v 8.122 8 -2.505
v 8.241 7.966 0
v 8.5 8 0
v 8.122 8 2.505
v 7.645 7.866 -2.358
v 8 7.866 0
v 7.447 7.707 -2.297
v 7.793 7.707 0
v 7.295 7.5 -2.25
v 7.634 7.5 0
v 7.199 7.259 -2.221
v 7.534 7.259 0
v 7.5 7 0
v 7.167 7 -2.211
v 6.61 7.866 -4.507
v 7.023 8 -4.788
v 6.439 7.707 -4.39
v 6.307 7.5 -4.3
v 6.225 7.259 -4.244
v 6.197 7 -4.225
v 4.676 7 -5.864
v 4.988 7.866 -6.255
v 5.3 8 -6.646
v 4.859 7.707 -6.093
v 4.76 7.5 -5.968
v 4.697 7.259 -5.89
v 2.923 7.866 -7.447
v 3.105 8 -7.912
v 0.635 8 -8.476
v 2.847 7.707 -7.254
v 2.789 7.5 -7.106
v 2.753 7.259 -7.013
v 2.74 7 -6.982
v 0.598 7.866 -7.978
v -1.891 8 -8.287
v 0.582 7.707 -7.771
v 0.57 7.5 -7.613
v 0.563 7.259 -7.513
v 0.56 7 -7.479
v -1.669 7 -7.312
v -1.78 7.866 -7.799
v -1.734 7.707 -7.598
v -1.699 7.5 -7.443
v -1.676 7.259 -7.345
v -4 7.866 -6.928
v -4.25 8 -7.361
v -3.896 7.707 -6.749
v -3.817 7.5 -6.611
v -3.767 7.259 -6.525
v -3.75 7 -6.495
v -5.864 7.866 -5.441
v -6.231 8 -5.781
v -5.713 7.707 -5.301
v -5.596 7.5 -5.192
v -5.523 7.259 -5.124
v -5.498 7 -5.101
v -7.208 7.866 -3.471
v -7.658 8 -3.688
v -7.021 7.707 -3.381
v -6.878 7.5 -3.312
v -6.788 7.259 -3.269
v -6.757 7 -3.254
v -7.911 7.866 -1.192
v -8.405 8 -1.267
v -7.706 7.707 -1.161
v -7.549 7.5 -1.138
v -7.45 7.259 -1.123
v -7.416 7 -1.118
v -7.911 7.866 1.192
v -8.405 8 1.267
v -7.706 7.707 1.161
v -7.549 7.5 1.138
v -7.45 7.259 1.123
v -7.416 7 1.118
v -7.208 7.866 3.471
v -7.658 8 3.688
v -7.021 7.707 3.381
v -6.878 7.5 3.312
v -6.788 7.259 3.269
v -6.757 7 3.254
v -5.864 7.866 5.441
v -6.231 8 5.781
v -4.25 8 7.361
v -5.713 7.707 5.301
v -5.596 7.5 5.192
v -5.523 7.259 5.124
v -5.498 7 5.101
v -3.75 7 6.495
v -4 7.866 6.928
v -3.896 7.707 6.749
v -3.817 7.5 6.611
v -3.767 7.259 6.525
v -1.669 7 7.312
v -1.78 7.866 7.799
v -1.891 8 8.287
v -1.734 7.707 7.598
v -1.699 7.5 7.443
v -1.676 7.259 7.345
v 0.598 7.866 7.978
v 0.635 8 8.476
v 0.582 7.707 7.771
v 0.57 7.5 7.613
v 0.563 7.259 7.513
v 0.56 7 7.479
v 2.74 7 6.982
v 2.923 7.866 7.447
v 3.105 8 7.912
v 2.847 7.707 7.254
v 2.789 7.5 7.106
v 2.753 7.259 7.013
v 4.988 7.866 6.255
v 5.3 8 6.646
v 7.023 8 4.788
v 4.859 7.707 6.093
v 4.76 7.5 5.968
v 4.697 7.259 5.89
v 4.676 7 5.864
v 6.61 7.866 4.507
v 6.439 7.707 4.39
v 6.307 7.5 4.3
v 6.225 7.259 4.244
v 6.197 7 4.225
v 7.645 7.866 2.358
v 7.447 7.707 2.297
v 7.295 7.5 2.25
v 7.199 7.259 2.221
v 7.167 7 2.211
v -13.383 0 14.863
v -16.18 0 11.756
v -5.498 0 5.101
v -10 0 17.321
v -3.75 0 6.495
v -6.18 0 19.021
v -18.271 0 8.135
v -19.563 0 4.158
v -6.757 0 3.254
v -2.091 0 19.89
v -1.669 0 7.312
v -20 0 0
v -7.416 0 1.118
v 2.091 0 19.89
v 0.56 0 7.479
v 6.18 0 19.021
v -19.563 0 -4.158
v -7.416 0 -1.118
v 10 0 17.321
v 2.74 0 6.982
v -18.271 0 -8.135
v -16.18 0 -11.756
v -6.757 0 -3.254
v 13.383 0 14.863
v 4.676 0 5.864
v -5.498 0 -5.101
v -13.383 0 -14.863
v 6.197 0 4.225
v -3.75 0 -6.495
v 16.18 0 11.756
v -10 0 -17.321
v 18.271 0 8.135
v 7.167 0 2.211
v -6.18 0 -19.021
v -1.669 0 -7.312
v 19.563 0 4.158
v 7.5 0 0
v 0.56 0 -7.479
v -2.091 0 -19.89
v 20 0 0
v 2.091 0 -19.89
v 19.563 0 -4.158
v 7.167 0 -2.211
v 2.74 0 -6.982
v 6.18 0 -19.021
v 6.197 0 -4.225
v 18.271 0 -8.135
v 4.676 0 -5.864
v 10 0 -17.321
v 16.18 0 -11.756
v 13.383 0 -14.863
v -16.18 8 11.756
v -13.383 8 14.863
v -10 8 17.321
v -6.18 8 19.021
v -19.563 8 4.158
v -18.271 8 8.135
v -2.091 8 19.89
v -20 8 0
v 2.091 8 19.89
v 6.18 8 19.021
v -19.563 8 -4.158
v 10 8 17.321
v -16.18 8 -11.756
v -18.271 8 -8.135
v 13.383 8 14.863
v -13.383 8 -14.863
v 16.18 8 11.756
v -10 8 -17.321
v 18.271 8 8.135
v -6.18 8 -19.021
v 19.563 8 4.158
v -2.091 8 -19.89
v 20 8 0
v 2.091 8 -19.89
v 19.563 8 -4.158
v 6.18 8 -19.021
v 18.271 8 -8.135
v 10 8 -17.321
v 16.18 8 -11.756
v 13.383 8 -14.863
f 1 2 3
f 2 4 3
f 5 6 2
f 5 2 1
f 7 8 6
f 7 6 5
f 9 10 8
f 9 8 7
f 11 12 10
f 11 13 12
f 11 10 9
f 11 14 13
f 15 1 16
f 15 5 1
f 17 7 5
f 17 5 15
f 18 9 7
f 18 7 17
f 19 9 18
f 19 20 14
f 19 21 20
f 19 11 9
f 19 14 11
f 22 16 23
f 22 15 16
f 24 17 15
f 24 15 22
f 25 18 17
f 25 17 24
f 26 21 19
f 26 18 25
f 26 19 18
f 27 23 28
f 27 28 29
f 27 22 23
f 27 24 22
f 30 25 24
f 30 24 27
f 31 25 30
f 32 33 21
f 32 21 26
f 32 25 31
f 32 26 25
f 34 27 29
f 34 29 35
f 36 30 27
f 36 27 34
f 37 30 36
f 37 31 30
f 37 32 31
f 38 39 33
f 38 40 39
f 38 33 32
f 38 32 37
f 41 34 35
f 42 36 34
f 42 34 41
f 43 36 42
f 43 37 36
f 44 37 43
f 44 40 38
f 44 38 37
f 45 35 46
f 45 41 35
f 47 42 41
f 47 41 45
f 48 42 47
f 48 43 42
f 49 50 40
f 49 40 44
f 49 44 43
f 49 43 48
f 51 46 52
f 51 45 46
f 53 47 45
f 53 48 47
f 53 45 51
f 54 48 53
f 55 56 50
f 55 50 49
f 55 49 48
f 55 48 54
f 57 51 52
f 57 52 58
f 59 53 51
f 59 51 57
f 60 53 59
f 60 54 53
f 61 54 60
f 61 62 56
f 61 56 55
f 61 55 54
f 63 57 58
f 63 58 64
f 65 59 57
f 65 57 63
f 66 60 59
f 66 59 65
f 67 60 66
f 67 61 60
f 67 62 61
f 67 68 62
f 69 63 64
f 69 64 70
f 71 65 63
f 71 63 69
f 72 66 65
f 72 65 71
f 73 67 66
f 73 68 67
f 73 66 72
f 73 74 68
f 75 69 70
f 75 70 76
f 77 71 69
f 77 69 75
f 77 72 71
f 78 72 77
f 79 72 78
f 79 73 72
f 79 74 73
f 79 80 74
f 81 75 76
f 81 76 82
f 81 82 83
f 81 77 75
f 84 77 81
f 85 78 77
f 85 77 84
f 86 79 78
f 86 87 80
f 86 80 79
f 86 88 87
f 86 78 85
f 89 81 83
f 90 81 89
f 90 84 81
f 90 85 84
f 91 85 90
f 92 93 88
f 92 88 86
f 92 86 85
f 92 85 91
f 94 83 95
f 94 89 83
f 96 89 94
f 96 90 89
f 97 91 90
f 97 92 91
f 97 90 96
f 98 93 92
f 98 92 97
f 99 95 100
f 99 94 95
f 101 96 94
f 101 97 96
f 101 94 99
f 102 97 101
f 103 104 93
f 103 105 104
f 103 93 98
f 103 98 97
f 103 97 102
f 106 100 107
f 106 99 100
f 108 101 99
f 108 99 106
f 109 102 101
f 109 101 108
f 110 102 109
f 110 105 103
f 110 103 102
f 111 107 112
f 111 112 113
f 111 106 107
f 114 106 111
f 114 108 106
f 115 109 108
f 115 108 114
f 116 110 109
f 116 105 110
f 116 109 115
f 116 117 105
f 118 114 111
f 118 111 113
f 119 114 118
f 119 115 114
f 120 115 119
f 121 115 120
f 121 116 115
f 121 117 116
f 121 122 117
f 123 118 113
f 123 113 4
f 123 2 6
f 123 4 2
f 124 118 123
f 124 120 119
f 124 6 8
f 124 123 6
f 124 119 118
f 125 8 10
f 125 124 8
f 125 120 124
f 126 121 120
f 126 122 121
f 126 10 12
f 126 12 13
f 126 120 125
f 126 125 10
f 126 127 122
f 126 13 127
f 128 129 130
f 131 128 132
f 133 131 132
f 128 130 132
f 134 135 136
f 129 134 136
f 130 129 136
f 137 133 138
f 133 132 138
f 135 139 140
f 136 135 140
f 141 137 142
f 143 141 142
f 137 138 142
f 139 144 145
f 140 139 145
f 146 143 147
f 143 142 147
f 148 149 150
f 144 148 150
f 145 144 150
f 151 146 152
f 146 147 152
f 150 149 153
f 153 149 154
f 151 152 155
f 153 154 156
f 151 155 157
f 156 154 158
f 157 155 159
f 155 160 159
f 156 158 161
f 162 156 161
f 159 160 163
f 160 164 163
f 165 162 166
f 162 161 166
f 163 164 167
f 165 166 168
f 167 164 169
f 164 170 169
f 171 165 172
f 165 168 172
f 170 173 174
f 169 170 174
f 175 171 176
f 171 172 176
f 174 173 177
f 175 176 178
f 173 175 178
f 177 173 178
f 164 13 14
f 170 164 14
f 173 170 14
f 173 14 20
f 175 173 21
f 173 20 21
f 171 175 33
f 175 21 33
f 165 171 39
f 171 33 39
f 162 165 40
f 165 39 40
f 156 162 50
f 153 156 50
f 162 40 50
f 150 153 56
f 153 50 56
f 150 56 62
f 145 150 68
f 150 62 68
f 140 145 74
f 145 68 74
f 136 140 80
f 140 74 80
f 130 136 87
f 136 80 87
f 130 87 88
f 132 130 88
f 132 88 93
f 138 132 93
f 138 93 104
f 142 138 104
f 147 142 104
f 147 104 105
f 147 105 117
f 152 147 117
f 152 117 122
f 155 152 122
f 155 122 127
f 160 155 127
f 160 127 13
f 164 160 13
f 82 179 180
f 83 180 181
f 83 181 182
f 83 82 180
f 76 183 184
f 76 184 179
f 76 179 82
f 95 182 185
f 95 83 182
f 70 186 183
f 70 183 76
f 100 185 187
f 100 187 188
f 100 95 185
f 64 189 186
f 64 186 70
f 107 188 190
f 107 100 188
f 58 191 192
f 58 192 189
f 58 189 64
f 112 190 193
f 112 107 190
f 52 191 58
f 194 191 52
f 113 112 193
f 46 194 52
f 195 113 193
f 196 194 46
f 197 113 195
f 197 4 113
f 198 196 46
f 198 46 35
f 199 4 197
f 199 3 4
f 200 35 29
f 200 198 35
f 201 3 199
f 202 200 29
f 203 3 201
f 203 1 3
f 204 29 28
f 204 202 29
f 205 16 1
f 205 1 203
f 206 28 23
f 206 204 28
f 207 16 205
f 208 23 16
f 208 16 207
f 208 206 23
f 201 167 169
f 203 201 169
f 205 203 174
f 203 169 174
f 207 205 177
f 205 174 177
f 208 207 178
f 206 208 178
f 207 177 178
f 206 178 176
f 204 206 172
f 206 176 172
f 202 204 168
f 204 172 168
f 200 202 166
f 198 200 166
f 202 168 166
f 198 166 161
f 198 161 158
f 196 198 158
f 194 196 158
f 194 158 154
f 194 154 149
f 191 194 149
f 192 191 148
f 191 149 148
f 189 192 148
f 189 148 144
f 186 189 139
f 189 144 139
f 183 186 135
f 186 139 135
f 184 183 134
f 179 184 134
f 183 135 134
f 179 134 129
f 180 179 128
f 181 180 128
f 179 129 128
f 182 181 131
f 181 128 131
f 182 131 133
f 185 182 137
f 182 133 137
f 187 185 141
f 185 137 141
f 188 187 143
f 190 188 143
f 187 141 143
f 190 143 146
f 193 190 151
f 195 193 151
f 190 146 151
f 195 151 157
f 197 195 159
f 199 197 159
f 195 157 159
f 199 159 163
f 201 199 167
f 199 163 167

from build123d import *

# Parameters (mm, degrees)
SKETCH1_R           = 20
BOSS_EXTRUDE1_DEPTH = 8
SKETCH2_R           = 7.5
CUT_EXTRUDE1_DEPTH  = 9
FILLET1_R           = 1


with BuildPart() as part:
    # Sketch1 → Boss-Extrude1 (new body)
    with BuildSketch(Plane(origin=(0, 0, 0), x_dir=(1, 0, 0), z_dir=(0, 1, 0))):
        Circle(SKETCH1_R)
    extrude(amount=BOSS_EXTRUDE1_DEPTH)

    # Sketch2 → Cut-Extrude1 (cut, through all)
    with BuildSketch(Plane(origin=(0, 8, 0), x_dir=(1, 0, 0), z_dir=(0, 1, 0))):
        Circle(SKETCH2_R)
    extrude(amount=-CUT_EXTRUDE1_DEPTH, mode=Mode.SUBTRACT)

    # Fillet1
    fillet1_edges = [part.edges().sort_by_distance(p)[0] for p in [
        (-7.5, 8, 0),
    ]]
    fillet(fillet1_edges, radius=FILLET1_R)


solid = part.part
